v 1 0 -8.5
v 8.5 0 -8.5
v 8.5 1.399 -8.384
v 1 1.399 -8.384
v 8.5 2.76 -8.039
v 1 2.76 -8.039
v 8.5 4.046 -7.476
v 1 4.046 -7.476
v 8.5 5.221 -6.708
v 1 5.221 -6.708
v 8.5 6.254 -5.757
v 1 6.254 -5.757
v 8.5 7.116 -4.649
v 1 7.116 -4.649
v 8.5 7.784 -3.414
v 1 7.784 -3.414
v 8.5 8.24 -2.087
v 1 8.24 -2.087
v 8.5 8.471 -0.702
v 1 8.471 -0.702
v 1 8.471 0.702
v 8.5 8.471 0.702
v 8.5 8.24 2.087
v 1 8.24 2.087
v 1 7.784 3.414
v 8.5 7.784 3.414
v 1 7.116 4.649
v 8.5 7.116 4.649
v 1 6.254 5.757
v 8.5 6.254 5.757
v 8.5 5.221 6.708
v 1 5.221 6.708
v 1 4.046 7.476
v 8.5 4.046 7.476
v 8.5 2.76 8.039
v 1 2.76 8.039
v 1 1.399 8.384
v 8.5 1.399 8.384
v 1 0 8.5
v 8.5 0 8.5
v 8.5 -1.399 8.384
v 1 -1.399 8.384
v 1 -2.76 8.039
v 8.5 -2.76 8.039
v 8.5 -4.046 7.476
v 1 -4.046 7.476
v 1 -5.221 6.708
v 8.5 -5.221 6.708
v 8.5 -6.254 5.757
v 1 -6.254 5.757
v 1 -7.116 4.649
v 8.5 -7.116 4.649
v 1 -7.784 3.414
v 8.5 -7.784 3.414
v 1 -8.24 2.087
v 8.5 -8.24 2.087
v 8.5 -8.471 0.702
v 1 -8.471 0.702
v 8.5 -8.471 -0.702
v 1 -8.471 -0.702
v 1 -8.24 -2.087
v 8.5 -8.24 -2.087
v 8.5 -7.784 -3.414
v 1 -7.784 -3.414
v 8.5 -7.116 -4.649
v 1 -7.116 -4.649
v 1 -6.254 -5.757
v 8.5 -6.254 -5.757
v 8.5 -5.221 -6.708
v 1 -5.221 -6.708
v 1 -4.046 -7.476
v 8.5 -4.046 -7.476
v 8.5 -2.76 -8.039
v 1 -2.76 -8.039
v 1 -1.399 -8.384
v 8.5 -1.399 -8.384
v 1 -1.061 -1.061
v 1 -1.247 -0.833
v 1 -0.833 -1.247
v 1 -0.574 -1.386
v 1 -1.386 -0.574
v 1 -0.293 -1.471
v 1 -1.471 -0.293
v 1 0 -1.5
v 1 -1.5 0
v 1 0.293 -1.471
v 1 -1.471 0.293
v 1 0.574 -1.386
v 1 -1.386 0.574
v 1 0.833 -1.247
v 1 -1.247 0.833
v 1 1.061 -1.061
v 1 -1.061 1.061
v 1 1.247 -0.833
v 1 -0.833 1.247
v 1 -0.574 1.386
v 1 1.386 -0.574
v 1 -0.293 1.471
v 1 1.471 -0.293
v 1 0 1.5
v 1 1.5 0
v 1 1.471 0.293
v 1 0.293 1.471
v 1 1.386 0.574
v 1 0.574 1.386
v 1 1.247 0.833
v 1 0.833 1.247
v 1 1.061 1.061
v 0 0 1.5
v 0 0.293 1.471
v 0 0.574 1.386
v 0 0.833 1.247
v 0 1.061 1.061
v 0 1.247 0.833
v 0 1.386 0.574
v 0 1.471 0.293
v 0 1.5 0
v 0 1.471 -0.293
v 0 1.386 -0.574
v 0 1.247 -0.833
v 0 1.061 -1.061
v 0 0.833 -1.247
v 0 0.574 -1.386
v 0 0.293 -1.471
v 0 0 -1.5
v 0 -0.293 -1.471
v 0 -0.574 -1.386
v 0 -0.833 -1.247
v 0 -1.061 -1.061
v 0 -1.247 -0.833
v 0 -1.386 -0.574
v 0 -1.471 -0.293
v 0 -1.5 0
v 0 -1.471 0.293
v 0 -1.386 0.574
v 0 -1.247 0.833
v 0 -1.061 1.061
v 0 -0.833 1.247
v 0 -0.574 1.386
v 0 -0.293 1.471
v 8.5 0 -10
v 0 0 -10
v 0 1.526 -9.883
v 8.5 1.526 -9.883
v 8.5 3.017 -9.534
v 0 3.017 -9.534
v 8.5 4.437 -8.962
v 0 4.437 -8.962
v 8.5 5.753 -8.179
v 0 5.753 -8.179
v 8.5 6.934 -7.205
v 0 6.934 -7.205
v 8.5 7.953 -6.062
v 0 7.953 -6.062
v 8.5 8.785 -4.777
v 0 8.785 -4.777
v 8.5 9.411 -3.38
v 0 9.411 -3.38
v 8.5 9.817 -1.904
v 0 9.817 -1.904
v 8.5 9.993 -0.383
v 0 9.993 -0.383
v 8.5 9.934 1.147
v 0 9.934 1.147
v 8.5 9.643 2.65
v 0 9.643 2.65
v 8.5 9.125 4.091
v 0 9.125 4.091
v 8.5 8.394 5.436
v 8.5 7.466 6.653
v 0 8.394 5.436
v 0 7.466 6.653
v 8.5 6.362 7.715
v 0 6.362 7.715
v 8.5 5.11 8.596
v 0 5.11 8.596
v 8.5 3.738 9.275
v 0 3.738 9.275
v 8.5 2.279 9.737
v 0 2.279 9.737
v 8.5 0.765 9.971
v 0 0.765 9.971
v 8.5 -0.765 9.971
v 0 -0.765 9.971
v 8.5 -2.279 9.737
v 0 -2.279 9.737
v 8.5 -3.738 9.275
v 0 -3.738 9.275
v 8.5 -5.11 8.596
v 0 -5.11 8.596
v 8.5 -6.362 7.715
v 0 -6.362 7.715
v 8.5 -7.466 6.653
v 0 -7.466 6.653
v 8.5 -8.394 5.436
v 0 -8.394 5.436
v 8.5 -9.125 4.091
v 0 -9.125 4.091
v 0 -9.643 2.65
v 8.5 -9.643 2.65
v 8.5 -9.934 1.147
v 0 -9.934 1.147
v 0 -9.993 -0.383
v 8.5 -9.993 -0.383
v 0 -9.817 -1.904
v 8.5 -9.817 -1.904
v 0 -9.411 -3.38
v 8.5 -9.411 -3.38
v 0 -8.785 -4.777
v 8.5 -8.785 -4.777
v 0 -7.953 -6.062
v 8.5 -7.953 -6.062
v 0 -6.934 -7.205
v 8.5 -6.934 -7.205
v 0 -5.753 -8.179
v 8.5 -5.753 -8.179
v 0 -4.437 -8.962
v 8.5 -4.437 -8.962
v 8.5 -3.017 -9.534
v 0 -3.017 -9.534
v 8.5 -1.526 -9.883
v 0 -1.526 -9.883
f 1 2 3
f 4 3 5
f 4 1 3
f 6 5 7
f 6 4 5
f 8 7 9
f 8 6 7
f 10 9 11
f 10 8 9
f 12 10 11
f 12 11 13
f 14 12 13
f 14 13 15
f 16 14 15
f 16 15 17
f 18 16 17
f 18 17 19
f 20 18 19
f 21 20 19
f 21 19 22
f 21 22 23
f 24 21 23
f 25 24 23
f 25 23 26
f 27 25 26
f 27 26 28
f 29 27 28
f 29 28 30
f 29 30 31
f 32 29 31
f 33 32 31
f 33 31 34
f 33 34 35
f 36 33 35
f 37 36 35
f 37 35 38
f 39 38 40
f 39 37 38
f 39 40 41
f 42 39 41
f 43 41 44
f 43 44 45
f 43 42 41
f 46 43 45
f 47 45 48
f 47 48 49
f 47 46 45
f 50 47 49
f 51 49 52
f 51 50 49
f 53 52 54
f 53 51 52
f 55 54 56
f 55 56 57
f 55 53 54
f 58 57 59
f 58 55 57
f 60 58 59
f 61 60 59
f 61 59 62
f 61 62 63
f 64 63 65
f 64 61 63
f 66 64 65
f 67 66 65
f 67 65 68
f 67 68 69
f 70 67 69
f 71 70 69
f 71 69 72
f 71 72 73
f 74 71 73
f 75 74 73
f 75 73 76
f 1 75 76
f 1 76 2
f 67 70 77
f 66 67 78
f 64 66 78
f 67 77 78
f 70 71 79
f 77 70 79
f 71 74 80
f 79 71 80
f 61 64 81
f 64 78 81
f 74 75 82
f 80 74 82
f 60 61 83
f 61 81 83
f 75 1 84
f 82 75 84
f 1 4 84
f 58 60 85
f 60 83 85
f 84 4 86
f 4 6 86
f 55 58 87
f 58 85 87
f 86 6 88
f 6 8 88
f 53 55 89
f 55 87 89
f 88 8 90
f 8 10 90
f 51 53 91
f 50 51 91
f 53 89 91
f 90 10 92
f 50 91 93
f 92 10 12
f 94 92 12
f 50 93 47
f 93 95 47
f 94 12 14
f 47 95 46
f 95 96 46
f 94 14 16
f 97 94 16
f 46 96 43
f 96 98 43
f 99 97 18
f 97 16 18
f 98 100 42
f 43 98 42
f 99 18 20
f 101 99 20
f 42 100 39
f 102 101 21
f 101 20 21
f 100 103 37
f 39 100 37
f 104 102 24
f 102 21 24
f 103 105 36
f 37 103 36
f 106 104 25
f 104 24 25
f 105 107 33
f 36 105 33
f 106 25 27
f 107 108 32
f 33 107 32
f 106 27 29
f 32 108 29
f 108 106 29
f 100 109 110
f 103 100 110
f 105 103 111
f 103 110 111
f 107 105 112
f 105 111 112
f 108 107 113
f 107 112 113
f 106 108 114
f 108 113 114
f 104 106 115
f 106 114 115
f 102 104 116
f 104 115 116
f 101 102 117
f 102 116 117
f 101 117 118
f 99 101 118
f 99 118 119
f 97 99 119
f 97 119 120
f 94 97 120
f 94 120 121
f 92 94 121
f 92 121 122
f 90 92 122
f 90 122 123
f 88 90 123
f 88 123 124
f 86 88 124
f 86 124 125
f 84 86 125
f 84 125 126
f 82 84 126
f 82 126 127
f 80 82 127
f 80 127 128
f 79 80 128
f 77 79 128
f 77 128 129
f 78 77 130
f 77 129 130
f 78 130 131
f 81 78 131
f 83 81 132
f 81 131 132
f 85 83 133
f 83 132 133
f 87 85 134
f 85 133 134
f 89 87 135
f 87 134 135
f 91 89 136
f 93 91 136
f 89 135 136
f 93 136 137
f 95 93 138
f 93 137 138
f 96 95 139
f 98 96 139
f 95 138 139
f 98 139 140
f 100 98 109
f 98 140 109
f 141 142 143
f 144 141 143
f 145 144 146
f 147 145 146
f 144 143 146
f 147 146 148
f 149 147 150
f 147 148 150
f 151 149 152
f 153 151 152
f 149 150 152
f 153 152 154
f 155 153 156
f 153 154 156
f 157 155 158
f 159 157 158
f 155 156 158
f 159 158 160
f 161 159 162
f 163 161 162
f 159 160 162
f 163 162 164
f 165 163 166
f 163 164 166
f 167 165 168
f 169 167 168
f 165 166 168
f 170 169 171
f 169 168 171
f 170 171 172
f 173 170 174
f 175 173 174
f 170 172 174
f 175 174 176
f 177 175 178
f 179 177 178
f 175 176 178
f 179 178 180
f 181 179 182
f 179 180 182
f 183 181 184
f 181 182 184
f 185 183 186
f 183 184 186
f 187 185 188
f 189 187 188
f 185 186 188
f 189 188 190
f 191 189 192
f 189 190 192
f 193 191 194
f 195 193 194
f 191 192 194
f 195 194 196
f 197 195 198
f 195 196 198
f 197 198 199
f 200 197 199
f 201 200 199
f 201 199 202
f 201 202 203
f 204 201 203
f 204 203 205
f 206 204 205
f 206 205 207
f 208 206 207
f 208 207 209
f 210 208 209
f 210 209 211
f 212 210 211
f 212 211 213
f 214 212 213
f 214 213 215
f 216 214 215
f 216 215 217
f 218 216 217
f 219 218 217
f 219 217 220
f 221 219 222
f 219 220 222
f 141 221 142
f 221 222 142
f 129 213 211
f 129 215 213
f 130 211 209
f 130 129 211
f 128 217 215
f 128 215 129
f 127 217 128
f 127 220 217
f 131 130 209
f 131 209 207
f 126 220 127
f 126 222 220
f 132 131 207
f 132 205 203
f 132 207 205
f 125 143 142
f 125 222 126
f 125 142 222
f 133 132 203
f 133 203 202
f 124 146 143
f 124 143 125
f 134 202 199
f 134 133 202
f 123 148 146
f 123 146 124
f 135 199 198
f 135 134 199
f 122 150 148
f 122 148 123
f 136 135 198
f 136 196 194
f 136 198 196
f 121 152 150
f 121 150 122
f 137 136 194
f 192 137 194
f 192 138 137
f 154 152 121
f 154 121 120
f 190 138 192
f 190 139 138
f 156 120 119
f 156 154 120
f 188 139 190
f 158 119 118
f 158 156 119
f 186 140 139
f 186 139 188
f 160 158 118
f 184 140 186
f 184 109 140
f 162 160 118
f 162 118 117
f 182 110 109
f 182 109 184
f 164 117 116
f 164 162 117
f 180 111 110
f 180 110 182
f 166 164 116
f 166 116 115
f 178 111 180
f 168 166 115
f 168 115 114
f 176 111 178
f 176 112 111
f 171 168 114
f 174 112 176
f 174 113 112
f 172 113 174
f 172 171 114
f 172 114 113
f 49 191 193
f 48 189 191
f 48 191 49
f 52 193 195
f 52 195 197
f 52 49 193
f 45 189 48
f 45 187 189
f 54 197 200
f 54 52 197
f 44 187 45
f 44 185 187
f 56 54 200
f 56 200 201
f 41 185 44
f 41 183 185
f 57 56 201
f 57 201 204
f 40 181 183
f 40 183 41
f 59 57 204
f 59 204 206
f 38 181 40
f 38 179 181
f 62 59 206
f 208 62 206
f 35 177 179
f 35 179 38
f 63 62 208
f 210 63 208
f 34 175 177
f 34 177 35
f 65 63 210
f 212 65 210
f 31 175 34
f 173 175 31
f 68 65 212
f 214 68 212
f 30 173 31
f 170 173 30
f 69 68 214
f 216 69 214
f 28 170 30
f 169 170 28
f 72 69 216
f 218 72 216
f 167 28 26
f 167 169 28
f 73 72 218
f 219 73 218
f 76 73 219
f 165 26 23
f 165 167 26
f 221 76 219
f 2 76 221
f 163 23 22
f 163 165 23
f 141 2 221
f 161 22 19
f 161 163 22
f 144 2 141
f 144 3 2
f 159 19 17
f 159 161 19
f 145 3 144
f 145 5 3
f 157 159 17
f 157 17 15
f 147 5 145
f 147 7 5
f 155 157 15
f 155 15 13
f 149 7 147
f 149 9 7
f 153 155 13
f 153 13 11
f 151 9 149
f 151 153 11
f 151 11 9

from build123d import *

# Parameters (mm, degrees)
SKETCH_1_R          = 10
SKETCH_1_R_2        = 8.5
EXTRUDE_1_DEPTH     = 8.5
SKETCH_2_R          = 8.5
EXTRUDE_2_DEPTH     = 1
SKETCH_7_R          = 1.5
CUT_EXTRUDE_3_DEPTH = 17.5


with BuildPart() as part:
    # ｽｹｯﾁ1 → ﾎﾞｽ - 押し出し1 (new body)
    with BuildSketch(Plane.YZ):
        with Locations(Location((0, 0, 0), (0, 0, 270))):
            Circle(SKETCH_1_R)
        with Locations(Location((0, 0, 0), (0, 0, 270))):
            Circle(SKETCH_1_R_2, mode=Mode.SUBTRACT)
    extrude(amount=EXTRUDE_1_DEPTH)

    # ｽｹｯﾁ2 → ﾎﾞｽ - 押し出し2 (add)
    with BuildSketch(Plane(origin=(0, 0, 0), x_dir=(0, -1, 0), z_dir=(-1, 0, 0))):
        with Locations(Location((0, 0, 0), (0, 0, 90))):
            Circle(SKETCH_2_R)
    extrude(amount=-EXTRUDE_2_DEPTH)

    # ｽｹｯﾁ7 → ｶｯﾄ - 押し出し3 (cut, through all)
    with BuildSketch(Plane(origin=(0, 0, 0), x_dir=(0, -1, 0), z_dir=(-1, 0, 0))):
        with Locations(Location((0, 0, 0), (0, 0, 90))):
            Circle(SKETCH_7_R)
    extrude(amount=-CUT_EXTRUDE_3_DEPTH, mode=Mode.SUBTRACT)


solid = part.part
